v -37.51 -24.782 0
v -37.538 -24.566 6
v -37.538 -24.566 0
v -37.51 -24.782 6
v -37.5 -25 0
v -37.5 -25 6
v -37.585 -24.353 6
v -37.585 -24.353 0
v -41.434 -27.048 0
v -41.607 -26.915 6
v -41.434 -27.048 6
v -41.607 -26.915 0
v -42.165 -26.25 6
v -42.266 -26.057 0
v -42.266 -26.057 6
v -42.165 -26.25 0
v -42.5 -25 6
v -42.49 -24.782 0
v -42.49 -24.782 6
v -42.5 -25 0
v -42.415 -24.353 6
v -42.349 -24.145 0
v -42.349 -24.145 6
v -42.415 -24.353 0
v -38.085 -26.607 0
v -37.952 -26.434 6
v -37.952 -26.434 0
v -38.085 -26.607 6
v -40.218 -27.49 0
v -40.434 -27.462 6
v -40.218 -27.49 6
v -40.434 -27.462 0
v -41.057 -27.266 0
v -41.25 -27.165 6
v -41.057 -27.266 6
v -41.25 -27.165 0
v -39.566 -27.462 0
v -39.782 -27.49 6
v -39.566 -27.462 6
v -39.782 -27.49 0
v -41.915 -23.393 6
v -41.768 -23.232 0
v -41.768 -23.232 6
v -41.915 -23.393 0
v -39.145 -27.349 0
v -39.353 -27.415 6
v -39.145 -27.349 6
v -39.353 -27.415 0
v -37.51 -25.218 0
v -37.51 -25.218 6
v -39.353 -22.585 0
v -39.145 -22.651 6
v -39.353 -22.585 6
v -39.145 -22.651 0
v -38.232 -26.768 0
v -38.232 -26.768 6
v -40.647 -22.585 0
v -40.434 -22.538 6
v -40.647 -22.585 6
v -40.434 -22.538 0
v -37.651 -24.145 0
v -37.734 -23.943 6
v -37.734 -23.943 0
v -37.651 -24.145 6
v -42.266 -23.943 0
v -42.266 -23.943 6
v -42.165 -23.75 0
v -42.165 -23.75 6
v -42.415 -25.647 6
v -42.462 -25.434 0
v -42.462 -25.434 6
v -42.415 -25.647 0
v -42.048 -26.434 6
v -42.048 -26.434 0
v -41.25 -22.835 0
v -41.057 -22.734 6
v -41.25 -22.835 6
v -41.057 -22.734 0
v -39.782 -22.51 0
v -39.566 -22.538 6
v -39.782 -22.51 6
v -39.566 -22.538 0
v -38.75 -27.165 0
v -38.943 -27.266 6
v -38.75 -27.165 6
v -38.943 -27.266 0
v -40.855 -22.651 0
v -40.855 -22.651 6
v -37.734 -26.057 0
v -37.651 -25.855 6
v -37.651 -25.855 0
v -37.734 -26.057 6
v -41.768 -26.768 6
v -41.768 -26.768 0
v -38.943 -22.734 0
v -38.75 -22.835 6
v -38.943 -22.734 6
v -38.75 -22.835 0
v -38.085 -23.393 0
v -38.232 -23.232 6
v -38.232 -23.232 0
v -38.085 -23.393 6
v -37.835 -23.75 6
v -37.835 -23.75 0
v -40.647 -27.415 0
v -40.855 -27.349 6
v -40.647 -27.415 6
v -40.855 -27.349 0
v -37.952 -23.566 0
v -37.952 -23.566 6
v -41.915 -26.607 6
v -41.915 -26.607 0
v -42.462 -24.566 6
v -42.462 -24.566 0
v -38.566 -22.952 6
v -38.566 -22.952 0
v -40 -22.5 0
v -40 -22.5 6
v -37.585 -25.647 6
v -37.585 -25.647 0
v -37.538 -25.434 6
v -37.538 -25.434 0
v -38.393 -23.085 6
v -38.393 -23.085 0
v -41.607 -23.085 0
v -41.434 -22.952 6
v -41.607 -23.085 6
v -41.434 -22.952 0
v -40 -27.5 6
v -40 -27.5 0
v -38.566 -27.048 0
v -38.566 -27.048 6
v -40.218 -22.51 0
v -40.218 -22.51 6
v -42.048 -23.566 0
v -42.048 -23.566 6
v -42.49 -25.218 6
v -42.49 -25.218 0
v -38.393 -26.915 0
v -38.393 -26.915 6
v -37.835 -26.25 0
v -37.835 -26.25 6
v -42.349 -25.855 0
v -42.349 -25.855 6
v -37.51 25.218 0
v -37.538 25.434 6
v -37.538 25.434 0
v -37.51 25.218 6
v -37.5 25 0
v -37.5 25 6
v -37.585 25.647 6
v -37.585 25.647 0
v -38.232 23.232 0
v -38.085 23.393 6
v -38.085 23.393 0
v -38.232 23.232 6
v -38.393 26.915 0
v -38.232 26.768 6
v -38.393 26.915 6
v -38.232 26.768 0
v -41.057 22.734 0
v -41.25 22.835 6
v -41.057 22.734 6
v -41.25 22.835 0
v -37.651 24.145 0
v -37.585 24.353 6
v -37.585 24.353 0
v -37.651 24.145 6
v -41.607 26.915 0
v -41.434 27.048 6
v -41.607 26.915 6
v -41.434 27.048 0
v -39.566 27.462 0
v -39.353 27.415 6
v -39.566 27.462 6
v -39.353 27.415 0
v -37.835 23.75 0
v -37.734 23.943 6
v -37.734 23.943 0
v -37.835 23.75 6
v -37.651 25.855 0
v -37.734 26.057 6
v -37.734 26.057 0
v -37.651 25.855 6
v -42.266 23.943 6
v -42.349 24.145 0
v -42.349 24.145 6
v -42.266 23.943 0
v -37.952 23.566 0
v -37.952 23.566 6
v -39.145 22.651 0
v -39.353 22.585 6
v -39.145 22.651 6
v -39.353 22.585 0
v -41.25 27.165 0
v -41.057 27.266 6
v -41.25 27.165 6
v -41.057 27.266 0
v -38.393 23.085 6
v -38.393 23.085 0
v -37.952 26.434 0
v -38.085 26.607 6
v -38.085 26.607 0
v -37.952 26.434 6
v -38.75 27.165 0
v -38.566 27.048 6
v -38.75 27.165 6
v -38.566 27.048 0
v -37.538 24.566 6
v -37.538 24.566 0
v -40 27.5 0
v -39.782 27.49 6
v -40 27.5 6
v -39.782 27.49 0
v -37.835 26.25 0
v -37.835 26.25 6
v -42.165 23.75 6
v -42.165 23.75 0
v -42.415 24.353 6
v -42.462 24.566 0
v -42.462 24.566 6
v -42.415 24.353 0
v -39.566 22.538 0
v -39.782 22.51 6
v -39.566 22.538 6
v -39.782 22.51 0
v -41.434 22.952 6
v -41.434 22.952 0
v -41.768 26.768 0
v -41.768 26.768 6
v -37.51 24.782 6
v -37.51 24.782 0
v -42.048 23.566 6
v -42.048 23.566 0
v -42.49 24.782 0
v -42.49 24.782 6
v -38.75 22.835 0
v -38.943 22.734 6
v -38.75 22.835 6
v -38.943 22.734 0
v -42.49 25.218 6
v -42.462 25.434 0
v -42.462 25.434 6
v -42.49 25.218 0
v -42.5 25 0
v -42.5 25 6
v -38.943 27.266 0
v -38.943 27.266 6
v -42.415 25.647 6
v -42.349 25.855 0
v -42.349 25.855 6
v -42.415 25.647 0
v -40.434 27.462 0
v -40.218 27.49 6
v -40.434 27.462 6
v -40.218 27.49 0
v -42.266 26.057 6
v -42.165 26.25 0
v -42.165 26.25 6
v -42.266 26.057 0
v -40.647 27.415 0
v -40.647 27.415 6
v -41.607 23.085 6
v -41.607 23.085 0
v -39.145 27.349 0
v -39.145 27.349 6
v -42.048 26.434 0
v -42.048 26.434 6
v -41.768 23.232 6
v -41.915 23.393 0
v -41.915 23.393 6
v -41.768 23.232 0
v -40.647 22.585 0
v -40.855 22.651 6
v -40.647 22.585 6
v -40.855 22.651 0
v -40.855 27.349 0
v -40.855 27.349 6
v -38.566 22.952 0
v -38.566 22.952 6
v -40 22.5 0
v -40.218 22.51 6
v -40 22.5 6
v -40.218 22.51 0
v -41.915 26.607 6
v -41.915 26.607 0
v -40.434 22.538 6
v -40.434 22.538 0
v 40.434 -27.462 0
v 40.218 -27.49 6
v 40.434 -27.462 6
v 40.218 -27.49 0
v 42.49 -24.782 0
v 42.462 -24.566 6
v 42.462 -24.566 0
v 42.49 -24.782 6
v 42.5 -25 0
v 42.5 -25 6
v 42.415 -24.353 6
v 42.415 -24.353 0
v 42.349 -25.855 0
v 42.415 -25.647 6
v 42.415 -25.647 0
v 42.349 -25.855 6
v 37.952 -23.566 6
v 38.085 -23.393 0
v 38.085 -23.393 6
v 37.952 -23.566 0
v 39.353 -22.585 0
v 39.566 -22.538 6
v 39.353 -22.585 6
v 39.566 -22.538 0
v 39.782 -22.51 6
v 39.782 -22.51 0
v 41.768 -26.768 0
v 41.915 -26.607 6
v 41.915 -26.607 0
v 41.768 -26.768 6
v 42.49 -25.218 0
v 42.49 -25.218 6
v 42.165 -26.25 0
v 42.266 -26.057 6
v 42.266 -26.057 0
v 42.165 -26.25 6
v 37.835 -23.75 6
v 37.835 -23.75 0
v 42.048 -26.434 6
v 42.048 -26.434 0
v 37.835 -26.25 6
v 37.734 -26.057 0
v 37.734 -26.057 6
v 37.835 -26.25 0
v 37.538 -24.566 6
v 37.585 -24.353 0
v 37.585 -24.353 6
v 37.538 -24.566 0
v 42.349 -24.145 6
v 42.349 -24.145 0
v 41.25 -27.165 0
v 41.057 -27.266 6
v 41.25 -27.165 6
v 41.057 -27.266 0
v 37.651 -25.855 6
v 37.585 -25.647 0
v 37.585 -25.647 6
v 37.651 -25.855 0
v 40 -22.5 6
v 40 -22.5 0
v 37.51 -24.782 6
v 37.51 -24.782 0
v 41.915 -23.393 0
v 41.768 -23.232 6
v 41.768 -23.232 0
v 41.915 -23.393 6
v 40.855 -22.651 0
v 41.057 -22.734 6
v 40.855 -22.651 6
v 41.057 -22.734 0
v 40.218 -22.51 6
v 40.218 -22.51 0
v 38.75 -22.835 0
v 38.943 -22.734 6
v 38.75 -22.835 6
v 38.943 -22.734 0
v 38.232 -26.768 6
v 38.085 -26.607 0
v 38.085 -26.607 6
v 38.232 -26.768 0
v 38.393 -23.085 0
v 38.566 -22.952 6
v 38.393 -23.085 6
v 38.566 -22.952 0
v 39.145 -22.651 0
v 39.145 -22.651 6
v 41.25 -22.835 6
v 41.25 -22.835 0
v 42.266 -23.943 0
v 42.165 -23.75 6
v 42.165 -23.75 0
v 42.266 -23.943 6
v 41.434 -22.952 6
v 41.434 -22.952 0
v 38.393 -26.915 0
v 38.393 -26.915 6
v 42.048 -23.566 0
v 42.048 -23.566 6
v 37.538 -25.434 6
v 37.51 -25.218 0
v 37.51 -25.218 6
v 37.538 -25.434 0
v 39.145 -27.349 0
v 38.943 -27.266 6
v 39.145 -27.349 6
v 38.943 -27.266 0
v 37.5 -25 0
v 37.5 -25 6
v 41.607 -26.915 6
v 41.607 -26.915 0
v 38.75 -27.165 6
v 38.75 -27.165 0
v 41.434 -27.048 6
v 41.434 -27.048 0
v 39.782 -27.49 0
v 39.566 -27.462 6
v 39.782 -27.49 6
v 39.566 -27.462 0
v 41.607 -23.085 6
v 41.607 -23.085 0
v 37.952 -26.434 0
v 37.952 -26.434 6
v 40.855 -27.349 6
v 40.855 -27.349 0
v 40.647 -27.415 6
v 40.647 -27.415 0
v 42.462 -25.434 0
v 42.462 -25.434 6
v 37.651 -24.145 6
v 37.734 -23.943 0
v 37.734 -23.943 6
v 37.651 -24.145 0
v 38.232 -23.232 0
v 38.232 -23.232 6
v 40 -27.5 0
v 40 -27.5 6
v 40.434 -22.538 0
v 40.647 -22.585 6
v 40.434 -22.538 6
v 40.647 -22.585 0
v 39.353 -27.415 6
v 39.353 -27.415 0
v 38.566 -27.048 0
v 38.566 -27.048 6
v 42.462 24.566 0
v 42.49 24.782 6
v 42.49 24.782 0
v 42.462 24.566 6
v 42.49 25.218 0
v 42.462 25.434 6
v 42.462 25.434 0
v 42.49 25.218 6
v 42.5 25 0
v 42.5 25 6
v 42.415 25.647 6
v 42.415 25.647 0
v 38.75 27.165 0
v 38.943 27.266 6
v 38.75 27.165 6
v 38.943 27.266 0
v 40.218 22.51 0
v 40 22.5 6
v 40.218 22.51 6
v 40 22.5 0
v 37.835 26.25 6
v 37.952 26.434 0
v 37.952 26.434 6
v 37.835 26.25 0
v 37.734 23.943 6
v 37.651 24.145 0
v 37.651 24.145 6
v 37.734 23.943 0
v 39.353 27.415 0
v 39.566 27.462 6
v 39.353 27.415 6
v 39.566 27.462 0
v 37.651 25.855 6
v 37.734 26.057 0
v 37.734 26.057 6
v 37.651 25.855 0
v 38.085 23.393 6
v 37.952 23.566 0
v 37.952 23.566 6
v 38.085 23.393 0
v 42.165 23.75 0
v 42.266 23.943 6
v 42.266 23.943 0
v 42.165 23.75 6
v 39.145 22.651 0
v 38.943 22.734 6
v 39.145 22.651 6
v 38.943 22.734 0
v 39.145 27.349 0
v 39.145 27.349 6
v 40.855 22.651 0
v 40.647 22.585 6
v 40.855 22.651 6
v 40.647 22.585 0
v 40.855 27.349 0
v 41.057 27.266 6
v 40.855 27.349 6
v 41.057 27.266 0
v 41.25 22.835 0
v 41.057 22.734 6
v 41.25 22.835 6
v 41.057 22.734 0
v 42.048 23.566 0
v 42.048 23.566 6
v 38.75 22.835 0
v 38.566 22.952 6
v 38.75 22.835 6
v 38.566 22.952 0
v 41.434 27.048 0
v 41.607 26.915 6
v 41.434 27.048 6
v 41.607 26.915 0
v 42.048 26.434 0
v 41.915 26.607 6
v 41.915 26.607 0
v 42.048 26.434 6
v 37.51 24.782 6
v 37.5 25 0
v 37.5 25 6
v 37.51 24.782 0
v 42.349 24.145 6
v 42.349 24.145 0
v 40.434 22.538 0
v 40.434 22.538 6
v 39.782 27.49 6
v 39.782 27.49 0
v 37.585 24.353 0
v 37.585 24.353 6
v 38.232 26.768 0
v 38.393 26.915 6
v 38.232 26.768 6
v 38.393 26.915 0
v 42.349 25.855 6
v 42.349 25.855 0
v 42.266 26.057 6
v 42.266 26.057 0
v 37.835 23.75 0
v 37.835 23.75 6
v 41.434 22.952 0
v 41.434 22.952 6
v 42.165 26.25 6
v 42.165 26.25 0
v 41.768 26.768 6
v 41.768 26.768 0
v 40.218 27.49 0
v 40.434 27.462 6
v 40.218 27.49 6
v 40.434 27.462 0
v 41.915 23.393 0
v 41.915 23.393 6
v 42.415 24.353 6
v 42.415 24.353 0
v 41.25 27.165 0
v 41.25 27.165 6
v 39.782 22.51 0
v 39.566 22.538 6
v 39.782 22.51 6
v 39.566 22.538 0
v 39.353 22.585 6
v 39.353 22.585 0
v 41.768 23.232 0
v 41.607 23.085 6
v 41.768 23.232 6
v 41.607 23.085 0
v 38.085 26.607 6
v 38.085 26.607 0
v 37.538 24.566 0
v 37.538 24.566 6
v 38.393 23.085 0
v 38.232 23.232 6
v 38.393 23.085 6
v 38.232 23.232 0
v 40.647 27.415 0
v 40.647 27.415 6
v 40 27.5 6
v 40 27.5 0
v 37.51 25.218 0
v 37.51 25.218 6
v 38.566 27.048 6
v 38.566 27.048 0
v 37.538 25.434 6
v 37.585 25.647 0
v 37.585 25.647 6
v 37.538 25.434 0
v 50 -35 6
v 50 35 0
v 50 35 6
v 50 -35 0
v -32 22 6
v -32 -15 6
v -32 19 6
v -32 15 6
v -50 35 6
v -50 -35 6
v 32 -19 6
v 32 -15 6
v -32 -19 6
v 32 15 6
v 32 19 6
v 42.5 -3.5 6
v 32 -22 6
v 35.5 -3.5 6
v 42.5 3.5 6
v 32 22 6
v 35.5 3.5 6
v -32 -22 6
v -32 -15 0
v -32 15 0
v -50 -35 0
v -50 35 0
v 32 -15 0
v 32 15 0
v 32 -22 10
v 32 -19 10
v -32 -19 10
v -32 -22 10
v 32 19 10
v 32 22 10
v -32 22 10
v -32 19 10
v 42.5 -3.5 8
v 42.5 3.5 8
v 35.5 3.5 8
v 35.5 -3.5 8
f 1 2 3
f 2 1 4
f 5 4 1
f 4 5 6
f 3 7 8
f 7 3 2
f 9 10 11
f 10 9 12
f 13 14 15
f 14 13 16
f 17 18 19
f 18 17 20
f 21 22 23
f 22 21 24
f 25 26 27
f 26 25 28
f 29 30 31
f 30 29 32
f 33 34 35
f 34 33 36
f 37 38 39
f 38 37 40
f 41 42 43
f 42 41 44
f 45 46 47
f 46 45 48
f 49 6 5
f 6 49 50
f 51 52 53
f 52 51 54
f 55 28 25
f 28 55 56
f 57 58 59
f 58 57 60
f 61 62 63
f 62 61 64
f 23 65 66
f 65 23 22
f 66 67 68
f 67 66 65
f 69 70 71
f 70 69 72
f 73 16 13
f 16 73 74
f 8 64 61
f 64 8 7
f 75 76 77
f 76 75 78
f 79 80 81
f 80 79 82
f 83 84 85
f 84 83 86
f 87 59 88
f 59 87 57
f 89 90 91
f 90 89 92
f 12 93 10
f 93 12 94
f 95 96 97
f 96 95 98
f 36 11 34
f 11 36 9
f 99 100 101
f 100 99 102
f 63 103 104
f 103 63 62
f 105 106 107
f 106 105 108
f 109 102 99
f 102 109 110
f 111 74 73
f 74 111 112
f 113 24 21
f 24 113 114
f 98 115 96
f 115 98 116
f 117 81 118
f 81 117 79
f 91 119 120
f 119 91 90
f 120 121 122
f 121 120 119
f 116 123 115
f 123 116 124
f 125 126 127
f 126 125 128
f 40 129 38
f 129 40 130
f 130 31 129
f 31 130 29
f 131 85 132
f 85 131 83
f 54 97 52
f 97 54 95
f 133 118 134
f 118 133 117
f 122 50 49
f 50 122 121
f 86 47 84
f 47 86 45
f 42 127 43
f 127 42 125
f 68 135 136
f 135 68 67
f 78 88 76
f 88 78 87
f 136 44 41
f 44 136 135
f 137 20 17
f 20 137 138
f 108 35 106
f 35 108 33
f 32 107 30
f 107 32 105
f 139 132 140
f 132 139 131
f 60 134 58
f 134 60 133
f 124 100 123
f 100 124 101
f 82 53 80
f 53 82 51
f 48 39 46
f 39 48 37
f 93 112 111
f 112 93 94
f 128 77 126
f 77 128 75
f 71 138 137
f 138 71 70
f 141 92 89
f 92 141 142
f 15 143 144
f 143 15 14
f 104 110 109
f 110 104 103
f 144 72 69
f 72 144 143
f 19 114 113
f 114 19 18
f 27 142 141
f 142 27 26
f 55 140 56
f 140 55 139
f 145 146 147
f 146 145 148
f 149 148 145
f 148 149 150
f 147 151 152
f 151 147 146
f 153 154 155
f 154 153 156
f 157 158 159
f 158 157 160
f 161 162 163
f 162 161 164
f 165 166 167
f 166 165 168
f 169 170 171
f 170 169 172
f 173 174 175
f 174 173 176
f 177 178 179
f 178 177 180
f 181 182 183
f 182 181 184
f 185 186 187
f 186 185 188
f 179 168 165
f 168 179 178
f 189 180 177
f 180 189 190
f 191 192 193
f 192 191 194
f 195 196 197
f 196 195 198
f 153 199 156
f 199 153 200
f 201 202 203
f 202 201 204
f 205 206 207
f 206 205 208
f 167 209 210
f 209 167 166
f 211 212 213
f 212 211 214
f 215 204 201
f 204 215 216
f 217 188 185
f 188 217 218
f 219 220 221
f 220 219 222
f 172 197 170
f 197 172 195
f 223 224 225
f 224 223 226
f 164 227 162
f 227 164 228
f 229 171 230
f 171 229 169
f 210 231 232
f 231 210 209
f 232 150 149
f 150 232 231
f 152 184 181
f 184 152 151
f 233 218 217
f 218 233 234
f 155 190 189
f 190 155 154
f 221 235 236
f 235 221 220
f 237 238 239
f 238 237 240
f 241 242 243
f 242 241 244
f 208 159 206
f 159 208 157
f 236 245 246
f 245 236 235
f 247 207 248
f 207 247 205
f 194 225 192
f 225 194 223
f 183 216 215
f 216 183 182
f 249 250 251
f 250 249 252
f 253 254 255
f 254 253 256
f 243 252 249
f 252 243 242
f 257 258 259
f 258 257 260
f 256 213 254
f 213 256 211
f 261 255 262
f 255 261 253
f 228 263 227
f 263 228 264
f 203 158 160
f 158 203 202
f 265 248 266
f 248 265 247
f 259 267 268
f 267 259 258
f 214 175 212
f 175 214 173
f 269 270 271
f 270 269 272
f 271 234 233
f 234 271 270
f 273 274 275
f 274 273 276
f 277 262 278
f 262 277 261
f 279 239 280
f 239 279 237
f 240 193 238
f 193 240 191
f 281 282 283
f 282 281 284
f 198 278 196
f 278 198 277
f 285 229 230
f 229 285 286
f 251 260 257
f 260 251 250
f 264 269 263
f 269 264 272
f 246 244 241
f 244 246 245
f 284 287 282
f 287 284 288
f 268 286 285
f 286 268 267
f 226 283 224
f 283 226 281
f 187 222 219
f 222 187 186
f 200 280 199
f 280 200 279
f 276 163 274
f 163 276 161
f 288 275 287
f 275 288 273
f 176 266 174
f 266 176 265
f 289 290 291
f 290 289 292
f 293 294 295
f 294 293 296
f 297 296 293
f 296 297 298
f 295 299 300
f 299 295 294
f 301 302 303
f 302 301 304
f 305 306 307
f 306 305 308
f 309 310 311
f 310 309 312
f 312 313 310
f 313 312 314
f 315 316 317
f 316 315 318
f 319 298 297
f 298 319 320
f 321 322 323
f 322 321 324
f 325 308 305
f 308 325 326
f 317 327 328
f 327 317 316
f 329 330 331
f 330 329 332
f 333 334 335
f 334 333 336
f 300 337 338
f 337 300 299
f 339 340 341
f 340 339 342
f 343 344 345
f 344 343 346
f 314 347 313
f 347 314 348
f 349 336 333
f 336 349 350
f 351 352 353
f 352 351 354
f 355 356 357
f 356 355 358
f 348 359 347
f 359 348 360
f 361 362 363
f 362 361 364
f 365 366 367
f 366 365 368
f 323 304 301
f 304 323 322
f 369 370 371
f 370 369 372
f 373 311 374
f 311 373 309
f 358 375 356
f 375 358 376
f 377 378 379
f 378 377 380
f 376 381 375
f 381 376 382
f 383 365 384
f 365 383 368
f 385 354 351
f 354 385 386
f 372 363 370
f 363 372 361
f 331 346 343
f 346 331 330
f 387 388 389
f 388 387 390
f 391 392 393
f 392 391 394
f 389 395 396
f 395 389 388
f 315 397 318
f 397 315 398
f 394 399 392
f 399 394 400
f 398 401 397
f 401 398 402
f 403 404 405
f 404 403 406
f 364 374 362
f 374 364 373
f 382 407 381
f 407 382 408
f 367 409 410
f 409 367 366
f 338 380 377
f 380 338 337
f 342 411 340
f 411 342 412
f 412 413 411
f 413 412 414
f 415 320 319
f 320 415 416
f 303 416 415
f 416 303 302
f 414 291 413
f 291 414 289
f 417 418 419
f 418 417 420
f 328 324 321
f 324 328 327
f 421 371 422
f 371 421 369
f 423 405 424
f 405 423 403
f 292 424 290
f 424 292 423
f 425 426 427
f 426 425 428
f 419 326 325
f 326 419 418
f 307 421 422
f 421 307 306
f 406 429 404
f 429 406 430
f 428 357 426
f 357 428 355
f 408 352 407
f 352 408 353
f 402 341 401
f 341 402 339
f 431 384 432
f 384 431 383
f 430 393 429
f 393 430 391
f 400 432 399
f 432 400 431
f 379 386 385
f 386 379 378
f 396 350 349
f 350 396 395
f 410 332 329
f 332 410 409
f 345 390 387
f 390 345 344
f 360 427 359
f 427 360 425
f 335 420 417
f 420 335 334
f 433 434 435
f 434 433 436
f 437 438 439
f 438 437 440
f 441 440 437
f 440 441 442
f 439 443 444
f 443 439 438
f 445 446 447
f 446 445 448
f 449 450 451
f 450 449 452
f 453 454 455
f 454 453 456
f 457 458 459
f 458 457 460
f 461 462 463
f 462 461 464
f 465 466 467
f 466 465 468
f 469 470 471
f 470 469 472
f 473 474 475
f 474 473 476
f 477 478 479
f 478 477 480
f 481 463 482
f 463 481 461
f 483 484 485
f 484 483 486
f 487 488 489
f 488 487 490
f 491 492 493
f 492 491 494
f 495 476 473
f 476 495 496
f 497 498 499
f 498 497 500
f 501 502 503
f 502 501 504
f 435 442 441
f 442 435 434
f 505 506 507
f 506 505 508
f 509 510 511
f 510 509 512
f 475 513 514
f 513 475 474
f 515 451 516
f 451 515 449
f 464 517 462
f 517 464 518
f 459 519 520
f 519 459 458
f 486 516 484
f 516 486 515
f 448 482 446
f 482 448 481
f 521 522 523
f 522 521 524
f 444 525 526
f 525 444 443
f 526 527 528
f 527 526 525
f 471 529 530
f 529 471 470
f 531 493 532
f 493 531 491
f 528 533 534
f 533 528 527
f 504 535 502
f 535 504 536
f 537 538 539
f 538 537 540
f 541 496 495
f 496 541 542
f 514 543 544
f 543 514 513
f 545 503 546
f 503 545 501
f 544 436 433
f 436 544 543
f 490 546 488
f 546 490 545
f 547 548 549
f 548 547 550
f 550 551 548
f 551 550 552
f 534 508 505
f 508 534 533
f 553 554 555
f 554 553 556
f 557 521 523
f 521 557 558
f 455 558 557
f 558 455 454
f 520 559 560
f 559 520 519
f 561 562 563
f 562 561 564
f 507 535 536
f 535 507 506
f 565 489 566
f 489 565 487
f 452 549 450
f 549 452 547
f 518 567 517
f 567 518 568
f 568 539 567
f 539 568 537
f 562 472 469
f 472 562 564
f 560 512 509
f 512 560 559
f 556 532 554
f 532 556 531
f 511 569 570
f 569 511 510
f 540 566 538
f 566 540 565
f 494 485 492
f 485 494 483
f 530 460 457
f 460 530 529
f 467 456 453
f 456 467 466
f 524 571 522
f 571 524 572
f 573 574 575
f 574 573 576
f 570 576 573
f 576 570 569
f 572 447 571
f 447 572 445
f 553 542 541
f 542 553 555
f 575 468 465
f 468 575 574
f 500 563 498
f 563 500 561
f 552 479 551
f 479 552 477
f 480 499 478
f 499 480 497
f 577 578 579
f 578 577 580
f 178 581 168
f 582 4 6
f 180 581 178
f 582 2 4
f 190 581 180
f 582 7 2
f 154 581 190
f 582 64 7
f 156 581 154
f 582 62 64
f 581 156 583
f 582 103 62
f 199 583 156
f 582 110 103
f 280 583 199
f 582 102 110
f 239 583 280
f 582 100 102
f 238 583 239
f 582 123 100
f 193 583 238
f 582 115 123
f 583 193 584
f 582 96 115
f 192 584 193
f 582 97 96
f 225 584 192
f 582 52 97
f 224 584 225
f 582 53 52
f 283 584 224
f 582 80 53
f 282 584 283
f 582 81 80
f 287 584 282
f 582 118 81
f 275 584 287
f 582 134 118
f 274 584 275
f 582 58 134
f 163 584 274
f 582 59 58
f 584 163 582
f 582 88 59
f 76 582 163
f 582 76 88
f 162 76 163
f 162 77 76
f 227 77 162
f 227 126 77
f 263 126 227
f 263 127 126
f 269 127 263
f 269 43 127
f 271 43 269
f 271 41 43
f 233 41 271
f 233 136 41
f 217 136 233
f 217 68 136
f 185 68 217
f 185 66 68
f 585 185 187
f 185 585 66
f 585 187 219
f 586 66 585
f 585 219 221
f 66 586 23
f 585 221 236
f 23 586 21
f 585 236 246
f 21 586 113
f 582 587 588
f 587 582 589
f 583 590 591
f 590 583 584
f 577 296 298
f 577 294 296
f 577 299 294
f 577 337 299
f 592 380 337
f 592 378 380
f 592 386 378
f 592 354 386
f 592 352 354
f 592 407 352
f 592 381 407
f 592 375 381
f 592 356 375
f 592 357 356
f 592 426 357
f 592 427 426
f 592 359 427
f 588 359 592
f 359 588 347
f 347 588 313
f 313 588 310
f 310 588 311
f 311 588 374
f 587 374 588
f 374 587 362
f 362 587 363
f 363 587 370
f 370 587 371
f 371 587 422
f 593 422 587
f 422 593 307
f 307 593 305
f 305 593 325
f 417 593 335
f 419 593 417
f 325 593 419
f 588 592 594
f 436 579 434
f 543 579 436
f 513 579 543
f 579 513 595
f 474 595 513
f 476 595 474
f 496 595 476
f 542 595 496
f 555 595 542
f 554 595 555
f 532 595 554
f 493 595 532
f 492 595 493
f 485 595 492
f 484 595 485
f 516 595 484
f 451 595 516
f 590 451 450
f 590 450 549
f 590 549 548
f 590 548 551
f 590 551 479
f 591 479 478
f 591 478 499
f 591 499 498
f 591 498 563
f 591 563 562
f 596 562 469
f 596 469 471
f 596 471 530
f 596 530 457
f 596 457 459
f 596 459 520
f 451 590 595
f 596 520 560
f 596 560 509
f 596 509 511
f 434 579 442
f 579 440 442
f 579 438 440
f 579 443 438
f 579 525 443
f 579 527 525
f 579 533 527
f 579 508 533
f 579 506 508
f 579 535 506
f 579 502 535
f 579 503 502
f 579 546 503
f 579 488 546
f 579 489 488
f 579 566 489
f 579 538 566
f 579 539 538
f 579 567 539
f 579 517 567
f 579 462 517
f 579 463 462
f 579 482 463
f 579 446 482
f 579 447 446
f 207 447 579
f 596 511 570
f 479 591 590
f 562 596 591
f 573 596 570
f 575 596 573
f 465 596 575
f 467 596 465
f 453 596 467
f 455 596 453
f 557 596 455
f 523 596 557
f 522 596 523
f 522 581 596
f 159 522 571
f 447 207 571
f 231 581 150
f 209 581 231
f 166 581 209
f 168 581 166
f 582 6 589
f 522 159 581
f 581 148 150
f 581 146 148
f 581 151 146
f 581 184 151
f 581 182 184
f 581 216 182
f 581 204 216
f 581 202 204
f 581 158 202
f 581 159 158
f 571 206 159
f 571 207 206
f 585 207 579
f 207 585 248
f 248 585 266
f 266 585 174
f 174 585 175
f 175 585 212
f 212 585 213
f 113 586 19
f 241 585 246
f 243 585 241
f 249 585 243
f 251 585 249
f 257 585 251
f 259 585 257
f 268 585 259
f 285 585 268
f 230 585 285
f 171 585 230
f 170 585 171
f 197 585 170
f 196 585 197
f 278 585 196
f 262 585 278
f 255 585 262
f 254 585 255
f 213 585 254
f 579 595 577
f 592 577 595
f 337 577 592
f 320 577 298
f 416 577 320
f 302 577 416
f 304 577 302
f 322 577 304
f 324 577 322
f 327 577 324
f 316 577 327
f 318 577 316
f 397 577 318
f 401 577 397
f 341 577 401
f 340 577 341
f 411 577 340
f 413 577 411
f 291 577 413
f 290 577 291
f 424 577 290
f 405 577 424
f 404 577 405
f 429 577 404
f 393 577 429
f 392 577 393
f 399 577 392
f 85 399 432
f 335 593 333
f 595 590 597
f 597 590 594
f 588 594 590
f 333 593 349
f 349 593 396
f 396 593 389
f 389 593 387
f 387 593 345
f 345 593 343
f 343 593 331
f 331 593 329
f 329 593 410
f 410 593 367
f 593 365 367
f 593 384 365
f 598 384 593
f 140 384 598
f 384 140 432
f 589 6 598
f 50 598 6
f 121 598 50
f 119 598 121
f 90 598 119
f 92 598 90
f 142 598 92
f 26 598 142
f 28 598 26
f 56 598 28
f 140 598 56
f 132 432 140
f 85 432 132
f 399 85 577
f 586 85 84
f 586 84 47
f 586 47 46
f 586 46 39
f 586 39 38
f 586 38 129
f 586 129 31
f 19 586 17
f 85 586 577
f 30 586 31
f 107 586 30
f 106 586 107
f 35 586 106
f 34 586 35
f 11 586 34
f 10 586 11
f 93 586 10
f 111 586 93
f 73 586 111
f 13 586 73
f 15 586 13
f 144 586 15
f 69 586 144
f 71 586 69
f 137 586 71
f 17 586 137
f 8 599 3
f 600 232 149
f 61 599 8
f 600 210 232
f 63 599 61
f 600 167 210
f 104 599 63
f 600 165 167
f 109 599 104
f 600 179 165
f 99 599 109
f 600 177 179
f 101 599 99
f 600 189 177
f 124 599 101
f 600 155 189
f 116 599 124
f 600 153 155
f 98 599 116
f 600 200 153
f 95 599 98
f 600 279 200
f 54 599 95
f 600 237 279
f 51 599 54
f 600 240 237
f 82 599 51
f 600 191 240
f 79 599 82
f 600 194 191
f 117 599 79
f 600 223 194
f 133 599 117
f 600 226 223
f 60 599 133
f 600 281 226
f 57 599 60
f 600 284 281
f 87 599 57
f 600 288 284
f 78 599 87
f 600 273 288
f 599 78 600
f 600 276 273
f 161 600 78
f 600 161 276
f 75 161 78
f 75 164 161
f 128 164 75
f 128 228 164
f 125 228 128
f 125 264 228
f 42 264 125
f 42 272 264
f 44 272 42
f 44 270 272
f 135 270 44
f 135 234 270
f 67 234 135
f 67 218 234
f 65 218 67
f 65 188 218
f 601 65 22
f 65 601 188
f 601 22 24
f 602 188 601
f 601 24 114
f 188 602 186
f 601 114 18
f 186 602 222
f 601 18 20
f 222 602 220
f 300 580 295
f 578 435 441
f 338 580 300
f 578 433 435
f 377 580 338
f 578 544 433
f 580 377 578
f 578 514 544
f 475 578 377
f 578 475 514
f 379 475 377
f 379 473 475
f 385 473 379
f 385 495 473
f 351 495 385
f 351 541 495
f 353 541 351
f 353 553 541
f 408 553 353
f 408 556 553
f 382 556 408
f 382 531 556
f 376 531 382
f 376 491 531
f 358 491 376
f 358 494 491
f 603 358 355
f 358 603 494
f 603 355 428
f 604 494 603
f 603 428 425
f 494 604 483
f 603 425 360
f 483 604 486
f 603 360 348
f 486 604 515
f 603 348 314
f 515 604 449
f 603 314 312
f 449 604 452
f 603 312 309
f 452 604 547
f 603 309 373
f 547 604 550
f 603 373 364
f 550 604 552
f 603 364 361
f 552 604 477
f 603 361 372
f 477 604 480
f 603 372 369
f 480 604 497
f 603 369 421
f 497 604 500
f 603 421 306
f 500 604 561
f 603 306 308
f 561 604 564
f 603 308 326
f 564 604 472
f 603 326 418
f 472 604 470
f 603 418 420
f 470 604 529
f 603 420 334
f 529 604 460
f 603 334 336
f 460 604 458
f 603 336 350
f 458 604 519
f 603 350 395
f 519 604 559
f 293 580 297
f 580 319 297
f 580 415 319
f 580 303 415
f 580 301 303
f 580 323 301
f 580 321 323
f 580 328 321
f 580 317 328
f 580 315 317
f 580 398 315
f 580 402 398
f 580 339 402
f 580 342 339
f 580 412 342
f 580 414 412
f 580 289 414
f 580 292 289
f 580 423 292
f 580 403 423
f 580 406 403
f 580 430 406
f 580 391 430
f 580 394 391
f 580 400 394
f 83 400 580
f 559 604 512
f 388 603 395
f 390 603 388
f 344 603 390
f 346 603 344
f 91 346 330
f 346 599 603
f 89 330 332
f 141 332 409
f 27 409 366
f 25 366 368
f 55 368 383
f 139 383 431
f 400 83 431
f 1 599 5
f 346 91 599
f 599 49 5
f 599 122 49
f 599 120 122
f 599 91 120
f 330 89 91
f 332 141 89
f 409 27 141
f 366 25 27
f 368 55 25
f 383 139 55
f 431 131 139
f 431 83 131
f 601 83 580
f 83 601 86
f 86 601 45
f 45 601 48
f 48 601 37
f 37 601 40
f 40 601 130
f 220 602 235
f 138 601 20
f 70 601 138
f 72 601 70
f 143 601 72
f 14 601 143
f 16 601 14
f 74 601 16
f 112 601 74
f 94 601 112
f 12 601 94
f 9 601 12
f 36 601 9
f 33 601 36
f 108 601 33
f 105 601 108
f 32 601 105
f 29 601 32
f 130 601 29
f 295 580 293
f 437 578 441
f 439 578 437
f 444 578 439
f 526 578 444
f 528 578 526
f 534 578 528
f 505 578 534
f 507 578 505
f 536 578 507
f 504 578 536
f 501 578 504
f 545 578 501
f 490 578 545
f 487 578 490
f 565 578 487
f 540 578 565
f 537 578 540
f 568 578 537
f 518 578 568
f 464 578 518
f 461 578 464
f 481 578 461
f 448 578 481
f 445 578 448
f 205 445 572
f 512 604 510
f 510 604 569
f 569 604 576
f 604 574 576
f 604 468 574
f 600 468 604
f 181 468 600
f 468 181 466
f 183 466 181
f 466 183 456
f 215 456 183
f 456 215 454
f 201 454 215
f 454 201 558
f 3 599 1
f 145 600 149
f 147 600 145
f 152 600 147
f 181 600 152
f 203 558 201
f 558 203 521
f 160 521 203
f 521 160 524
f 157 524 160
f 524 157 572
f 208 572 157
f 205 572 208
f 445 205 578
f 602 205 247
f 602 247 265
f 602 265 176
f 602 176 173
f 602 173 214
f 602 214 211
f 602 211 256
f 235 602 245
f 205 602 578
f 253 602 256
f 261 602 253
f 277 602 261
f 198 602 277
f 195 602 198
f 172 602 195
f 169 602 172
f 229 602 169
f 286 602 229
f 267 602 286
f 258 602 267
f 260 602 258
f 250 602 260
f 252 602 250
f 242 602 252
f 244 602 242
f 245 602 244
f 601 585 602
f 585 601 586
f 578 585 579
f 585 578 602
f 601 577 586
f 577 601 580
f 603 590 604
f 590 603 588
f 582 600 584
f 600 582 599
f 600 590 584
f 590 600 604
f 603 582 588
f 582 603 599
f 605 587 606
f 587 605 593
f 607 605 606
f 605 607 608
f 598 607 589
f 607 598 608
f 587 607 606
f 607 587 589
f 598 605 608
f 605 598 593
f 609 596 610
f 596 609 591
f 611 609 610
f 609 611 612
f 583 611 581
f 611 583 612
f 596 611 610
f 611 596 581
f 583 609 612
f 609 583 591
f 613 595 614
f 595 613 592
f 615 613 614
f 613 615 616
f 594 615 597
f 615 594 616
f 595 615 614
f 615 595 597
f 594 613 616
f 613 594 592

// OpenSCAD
// Microfluidic chip imaging holder — reference solution
// Category: tools; purpose: repeatable positioning during optical chip imaging
// Print on flat base with z=0 on bed; PLA/PETG, no supports; not certified for clinical or sterile use
// SPDX-License-Identifier: CERN-OHL-P-2.0
$fn=72;
eps=0.05;
base_x=100;
base_y=70;
base_h=6;
window_x=64;
window_y=30;
hole_d=5;
hole_pitch_x=80;
hole_pitch_y=50;
rail_len=64;
rail_width=3;
rail_h=4;
rail_center_y=20.5;
marker_x=7;
marker_y=7;
marker_h=2;
marker_center_x=39;
assert(base_x > window_x + 2*hole_d);
assert(base_y > window_y + 2*hole_d);
assert(hole_pitch_x/2+hole_d/2 < base_x/2);
assert(hole_pitch_y/2+hole_d/2 < base_y/2);
assert(rail_center_y - rail_width/2 > window_y/2);
module reference(){
 union(){
  difference(){
   translate([-base_x/2,-base_y/2,0]) cube([base_x,base_y,base_h]);
   translate([-window_x/2,-window_y/2,-eps]) cube([window_x,window_y,base_h+2*eps]);
   for(x=[-hole_pitch_x/2,hole_pitch_x/2])
    for(y=[-hole_pitch_y/2,hole_pitch_y/2])
     translate([x,y,-eps]) cylinder(d=hole_d,h=base_h+2*eps);
  }
  for(y=[-rail_center_y,rail_center_y])
   translate([-rail_len/2,y-rail_width/2,base_h-eps])
    cube([rail_len,rail_width,rail_h+eps]);
  translate([marker_center_x-marker_x/2,-marker_y/2,base_h-eps])
   cube([marker_x,marker_y,marker_h+eps]);
 }
}
reference();
